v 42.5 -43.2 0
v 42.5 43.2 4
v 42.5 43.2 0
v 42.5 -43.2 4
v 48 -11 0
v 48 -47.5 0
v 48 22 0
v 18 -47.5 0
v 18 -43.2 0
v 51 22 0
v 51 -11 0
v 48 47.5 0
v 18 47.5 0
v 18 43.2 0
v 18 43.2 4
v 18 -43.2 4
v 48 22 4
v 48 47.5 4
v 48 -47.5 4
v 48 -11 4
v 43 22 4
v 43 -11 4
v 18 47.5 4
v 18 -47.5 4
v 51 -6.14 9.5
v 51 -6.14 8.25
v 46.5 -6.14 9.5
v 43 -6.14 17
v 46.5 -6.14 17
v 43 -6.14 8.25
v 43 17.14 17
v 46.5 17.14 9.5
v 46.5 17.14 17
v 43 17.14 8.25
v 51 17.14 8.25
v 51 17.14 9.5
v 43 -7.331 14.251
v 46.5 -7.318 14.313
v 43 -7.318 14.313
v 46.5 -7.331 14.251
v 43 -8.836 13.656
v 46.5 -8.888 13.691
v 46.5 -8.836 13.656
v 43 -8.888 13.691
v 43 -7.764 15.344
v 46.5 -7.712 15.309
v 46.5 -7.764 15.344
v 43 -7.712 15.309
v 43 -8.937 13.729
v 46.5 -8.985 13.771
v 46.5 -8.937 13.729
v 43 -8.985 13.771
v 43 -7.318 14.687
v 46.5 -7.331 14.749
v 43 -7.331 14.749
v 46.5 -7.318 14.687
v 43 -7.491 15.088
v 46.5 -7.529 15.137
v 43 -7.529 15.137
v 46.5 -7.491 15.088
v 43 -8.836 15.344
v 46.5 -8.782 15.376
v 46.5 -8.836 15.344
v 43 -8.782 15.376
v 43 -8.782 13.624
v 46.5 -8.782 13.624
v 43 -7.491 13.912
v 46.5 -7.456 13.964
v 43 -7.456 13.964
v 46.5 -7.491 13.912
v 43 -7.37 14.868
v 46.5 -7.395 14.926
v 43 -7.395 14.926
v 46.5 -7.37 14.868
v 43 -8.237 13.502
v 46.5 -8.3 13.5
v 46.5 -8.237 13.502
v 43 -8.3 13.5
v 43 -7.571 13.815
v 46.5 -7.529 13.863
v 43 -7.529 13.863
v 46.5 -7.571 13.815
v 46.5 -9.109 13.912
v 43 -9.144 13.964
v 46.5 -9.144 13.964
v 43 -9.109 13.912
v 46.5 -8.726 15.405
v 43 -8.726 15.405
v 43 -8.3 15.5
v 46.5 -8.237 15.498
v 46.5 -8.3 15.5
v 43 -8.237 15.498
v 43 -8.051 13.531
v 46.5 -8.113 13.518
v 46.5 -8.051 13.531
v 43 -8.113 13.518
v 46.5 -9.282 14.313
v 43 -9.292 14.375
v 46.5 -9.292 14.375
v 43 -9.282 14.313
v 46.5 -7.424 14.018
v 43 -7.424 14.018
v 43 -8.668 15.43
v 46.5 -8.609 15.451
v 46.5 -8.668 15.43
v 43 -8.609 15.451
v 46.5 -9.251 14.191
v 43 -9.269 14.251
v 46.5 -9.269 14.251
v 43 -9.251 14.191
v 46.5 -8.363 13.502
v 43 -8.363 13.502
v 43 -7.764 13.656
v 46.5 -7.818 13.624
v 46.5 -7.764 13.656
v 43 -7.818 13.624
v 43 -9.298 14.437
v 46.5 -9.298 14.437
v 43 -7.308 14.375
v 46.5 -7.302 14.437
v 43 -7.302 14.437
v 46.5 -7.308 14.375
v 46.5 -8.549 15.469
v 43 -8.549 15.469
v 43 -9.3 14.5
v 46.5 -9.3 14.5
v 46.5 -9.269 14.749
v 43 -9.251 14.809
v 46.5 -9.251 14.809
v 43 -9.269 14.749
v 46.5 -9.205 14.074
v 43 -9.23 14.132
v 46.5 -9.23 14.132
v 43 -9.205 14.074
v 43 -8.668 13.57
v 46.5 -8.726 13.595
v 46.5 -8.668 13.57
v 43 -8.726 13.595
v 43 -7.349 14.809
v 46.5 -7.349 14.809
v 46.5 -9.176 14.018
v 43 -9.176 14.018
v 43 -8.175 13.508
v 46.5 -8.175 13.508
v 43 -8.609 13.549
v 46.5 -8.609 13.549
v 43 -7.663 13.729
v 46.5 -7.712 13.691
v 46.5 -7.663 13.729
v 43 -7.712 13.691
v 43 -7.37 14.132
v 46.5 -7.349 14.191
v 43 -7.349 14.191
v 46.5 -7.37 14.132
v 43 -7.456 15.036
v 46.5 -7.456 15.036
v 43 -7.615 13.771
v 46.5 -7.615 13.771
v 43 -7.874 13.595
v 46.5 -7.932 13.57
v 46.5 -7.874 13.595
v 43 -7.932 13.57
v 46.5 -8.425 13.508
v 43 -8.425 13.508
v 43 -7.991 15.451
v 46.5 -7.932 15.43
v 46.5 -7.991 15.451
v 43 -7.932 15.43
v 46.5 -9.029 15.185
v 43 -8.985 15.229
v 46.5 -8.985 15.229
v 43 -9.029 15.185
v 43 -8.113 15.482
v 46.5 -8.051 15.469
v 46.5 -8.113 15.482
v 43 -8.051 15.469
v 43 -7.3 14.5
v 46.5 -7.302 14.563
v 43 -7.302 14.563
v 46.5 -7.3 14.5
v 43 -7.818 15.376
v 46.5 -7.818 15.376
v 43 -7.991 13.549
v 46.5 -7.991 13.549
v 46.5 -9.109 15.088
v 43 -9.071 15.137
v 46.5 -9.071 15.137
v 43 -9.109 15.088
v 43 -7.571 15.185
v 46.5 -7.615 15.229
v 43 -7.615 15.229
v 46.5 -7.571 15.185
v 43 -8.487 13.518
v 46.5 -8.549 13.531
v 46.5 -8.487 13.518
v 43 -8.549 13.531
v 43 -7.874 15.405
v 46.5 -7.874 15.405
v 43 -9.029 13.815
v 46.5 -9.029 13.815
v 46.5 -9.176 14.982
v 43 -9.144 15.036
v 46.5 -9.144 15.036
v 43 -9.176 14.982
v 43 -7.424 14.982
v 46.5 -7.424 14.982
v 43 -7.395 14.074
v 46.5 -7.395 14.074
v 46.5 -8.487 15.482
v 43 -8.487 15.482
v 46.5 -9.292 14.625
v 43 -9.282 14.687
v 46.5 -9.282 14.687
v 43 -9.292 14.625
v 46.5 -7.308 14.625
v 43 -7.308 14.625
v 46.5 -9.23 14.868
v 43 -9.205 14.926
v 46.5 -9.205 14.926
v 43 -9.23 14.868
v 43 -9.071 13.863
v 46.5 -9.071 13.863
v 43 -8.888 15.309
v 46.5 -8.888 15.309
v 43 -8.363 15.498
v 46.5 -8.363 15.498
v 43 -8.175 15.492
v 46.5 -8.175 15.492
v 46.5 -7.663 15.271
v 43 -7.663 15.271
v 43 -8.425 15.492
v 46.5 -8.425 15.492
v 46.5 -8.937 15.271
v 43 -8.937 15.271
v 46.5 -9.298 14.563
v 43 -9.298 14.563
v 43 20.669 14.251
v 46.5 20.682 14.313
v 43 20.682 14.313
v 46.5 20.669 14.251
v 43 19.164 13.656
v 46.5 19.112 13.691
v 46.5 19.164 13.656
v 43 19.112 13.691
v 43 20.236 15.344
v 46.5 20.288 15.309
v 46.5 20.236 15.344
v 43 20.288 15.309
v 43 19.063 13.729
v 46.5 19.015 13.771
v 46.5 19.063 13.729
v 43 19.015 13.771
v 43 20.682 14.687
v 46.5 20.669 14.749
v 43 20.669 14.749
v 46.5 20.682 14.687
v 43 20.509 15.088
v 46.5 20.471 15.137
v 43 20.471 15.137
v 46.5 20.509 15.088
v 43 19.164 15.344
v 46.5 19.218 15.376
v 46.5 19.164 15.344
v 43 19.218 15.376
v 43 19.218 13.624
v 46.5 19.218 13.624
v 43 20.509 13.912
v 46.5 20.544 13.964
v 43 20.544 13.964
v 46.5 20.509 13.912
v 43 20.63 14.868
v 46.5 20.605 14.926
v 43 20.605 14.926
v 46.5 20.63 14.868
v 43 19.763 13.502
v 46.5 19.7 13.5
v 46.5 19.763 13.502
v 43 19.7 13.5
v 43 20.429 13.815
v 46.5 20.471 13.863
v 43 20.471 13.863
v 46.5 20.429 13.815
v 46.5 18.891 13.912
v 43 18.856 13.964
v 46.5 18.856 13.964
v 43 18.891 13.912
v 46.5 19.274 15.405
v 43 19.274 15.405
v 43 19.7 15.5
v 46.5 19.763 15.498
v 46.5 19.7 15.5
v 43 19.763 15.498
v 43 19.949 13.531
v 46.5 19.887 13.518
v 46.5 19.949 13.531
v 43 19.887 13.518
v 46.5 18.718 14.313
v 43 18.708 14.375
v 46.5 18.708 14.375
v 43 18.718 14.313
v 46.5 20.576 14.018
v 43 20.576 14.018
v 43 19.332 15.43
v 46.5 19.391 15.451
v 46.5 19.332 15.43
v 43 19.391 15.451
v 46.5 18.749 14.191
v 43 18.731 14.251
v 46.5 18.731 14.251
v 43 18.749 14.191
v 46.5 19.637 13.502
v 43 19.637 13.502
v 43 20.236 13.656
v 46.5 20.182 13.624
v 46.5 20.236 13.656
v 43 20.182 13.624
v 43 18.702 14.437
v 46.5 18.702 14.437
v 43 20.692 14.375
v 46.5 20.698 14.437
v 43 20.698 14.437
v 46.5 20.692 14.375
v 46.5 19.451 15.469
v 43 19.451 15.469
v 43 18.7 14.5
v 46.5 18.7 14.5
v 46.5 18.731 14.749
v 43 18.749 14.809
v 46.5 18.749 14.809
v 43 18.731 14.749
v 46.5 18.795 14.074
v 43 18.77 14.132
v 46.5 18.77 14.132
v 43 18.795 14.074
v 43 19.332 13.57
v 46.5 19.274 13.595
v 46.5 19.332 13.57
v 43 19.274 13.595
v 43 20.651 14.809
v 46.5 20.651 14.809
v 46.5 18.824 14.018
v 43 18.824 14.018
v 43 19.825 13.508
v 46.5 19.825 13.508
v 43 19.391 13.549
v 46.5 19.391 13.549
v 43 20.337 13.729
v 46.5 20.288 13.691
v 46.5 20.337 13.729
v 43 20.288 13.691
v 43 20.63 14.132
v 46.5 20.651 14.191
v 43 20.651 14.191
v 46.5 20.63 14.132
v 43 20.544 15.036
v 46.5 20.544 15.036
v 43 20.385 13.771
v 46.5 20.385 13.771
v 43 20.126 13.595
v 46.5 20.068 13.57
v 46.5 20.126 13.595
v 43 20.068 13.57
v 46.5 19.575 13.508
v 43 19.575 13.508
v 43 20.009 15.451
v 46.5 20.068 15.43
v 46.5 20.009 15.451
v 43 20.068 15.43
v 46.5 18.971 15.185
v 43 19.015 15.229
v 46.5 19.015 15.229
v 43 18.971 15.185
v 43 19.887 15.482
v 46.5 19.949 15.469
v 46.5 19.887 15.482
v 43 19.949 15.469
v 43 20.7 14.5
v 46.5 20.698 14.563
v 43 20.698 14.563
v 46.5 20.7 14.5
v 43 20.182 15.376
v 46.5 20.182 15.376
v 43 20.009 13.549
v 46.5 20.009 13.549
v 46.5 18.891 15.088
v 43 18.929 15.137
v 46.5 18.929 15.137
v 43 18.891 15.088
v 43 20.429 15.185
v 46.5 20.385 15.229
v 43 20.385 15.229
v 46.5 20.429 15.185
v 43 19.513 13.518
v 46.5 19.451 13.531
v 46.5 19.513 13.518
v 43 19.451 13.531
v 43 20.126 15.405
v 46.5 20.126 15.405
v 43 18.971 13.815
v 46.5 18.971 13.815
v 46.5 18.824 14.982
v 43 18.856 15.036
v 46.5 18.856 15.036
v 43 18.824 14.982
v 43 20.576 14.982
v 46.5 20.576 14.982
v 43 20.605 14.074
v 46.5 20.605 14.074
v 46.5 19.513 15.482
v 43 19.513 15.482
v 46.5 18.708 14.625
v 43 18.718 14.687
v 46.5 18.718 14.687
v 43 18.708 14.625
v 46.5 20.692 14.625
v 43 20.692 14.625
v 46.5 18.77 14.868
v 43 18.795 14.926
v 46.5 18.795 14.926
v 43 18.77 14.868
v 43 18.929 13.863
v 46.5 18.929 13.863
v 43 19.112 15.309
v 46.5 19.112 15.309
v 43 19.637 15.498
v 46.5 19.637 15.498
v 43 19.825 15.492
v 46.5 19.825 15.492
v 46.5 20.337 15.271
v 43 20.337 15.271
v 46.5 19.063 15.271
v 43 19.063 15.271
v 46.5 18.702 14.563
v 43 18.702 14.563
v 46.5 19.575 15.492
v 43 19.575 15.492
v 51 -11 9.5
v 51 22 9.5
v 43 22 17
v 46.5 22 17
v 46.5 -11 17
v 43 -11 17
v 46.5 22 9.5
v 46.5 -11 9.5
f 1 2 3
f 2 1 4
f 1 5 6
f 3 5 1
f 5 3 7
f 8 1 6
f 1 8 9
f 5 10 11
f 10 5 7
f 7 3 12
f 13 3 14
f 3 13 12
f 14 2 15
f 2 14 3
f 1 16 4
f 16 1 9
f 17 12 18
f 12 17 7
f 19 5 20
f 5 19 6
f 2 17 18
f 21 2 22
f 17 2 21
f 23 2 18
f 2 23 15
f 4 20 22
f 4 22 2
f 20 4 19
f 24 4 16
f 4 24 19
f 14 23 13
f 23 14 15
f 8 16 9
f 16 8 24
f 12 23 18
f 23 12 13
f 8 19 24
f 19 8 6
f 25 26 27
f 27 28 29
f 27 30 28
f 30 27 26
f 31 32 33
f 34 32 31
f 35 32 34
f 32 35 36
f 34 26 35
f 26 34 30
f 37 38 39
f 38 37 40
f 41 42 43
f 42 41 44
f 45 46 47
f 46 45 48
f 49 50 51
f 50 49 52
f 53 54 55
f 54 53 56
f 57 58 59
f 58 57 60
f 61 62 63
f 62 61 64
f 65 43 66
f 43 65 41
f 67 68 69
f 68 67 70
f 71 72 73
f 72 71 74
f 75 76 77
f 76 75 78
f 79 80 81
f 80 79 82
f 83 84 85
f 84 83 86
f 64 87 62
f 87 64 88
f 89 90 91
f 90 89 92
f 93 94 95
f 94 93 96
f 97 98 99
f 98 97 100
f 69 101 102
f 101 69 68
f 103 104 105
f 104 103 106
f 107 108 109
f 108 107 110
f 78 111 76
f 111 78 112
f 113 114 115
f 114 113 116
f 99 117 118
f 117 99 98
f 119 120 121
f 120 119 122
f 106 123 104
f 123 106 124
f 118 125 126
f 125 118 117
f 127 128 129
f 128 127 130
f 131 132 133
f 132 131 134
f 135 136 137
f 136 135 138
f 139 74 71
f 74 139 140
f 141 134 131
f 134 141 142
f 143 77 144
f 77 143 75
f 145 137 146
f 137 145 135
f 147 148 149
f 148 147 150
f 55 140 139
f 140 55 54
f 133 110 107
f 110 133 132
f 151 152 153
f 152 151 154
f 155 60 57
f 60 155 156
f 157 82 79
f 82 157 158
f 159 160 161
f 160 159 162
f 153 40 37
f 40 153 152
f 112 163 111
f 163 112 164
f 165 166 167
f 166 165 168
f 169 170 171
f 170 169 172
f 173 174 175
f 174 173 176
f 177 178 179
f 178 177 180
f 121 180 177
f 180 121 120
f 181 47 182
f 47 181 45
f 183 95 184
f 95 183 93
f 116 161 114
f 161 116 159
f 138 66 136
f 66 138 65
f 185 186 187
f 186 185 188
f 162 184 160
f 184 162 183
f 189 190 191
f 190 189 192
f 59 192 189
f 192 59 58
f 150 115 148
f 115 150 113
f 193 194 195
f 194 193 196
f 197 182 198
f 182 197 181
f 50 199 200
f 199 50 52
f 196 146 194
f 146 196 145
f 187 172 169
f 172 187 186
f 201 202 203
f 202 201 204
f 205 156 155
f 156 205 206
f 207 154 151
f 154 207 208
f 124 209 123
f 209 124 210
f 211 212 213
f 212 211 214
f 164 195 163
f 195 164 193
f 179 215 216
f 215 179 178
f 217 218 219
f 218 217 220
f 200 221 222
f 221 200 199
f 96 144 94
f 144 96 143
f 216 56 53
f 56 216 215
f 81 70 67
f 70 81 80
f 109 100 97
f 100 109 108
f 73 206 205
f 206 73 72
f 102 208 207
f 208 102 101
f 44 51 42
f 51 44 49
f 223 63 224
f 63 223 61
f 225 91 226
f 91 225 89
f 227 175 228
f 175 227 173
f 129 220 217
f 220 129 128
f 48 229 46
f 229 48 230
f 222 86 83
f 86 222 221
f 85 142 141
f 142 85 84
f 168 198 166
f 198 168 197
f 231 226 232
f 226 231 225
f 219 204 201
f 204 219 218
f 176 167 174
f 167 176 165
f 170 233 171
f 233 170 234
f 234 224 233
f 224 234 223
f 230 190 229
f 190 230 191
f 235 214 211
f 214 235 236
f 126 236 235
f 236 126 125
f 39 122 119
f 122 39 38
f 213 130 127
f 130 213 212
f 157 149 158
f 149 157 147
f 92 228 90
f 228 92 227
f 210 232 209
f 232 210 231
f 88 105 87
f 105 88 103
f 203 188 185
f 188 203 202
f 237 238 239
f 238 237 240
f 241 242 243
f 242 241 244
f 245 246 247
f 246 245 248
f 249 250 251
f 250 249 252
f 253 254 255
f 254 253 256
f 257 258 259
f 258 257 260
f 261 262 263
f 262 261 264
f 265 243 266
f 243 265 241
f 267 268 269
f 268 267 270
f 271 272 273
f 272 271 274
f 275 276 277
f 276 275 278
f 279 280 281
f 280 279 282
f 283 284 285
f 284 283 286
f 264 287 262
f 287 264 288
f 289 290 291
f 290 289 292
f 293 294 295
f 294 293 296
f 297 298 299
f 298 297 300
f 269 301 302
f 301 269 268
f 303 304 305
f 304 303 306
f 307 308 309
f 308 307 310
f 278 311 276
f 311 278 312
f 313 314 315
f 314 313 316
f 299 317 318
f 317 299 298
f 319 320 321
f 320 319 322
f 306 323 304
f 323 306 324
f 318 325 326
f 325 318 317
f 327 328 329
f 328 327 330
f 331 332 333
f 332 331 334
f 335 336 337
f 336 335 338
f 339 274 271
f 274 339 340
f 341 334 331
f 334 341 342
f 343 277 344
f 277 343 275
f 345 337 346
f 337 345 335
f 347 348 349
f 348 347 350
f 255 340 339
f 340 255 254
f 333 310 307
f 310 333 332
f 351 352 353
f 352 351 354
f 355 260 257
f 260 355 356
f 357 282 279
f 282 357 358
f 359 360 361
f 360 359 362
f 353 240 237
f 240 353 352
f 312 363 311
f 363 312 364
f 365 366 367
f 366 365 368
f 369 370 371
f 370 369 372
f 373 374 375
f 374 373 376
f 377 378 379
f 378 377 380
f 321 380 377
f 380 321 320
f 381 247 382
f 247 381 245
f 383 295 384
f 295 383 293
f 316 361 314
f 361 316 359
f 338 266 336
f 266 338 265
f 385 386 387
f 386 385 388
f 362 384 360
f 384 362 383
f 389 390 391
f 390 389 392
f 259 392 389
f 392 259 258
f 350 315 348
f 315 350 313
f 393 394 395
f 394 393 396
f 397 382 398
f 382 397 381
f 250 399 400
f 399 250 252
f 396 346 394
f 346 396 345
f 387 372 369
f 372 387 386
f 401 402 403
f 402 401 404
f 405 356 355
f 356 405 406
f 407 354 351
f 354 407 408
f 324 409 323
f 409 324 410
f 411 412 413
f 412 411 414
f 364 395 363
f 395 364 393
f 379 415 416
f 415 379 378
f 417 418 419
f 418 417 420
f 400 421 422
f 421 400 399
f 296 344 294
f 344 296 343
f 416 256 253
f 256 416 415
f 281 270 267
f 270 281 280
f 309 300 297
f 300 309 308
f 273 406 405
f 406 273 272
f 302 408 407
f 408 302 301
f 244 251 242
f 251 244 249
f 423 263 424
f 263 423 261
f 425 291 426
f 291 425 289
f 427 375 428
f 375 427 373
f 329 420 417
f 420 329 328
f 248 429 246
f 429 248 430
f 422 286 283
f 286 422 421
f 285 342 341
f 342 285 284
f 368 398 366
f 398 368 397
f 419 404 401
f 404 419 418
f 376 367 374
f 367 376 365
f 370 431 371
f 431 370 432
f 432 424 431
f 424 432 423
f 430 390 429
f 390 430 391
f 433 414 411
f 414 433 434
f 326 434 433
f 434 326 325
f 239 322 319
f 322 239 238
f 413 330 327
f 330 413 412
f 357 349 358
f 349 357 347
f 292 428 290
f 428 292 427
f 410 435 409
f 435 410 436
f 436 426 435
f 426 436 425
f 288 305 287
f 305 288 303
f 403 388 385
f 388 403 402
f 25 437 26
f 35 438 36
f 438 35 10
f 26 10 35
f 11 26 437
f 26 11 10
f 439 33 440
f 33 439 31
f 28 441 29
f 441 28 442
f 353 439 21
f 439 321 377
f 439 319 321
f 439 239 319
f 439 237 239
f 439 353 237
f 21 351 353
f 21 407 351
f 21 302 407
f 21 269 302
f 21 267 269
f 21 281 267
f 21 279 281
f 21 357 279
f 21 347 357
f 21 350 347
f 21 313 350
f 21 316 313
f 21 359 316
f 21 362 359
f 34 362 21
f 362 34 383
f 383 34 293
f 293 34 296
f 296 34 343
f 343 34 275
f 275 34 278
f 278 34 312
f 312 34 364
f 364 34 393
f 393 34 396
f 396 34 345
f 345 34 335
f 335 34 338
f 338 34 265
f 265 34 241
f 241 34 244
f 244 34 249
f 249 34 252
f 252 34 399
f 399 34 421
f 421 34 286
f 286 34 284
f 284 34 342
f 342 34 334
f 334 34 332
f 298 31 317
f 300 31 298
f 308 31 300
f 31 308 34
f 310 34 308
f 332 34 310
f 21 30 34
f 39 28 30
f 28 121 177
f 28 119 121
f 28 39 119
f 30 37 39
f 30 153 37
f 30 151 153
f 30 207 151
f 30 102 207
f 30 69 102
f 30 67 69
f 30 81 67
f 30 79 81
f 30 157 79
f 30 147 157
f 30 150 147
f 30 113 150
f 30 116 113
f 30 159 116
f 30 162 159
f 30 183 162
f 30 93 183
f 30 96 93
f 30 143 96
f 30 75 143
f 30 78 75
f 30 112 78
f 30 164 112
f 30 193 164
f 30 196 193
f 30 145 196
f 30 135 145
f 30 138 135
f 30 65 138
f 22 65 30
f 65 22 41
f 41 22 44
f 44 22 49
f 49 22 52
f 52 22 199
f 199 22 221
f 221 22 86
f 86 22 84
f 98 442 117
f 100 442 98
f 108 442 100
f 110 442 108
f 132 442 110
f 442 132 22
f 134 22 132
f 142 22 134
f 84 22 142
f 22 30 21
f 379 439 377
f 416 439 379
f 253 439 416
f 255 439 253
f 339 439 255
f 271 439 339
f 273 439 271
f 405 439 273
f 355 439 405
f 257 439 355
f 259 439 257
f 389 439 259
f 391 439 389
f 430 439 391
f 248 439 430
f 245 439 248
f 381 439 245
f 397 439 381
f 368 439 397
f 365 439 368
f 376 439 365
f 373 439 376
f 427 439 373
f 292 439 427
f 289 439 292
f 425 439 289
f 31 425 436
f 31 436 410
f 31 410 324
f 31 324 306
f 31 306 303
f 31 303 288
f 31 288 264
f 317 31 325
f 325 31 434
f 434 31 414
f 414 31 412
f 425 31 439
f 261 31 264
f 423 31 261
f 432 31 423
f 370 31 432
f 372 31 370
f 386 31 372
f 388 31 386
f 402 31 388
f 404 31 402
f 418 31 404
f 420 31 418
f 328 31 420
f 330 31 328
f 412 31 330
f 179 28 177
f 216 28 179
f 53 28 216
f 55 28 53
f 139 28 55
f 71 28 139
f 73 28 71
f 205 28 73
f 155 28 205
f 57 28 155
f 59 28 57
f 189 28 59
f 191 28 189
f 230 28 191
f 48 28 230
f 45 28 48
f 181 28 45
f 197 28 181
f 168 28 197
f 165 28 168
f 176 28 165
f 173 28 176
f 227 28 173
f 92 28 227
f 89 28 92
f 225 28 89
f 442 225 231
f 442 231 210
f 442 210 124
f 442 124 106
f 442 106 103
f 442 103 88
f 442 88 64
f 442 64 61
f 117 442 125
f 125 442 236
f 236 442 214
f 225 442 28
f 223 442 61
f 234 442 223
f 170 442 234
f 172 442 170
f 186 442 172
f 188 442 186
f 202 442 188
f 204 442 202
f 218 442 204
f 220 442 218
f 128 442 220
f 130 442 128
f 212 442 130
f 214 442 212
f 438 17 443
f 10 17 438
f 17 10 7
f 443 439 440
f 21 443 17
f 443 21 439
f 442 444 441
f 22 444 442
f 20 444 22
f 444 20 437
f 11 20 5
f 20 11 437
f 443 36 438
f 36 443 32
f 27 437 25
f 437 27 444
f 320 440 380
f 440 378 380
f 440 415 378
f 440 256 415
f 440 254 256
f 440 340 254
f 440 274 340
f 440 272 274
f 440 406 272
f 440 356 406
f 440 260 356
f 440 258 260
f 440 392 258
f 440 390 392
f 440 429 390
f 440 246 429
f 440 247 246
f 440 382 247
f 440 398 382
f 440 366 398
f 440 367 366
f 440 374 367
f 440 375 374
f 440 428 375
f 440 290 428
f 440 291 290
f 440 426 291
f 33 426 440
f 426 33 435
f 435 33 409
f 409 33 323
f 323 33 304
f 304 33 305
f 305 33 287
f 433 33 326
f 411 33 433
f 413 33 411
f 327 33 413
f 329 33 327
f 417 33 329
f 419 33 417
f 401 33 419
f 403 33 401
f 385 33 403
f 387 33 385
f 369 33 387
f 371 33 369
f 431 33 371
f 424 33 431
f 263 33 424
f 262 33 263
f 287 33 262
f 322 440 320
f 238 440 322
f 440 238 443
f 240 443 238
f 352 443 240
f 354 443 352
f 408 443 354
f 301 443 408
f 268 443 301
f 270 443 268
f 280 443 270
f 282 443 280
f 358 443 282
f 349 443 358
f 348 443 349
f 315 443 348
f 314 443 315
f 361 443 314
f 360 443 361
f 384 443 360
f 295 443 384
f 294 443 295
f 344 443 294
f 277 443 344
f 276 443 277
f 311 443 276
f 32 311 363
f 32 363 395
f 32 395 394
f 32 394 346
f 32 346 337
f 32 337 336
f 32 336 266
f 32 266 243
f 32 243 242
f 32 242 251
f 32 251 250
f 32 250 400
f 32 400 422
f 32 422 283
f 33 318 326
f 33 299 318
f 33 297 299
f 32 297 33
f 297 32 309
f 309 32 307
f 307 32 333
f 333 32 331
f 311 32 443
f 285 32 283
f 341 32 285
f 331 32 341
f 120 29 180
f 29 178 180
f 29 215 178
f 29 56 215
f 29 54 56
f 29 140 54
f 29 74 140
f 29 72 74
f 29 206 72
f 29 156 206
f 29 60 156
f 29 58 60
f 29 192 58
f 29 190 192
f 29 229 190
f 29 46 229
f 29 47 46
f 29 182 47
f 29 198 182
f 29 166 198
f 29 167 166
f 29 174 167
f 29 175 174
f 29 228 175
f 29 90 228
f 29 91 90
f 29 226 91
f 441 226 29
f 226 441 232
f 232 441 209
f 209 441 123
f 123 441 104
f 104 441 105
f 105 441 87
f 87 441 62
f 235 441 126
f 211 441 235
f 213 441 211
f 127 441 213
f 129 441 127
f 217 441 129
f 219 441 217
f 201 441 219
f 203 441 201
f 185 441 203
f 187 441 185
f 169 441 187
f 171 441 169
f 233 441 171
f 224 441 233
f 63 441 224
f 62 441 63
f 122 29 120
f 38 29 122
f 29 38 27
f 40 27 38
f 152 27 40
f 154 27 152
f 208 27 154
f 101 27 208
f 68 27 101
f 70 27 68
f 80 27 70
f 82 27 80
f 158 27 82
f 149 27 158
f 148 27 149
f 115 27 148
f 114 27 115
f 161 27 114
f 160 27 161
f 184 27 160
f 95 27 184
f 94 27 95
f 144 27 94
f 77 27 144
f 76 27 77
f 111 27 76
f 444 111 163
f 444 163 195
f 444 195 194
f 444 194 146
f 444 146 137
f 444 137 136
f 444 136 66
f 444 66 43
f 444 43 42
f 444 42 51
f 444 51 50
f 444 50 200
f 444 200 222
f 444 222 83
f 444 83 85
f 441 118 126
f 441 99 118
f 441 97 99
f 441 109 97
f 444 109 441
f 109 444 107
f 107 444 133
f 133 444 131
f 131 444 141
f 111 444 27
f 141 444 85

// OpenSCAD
// file: servo.scad
$fn=100;

module servo(shell=false)
{
	cube([56,20.5,2.5],center=true);
	translate([0,0,-10])
		if(shell){ cube([44,21.5,40],true); } else { cube([42,20.5,40],true); }
	translate([11,0,10]){ cylinder(r=6,h=1.5); cylinder(r=3,h=5); }
	for(i=25*[-1,1]) for(j=5*[-1,1]) translate([i,j,0])
		cylinder(r=2.25,h=30,center=true);
}

module 9g_servo()
{
	l = 23.28; // length
	w = 12.5; // width (or depth)
	h = 23.3; // height of main body
	c = 6; // bottom "cap" height
	f = 5; // length of flange
	fz = 2.36; // thickness of flange
	fh = 16.44 + (fz/2); // position of flange
	
	mc = 3.75; // main cyl height
	ax = 2.75; // axle height
	ar = 2.455; // axle radius
	ah = h+ax; // axle pos
	sx = -0.89; // sub cyl center
	sr = 2.905; // sub cyl radius

	l2 = l/2;
	l4 = l/4;
	w2 = w/2;
	
	difference()
	{
		union() {
			translate( [-l2, -w2,  c] ) cube([l,w,h-c]); // main body
			translate( [-l2, -w2,  0] ) cube([l,w,  c]); // bottom cap
			translate( [  0,   0, fh] ) cube([l+f+f,w,fz], center=true); // flange
			translate( [ l4,   0,  h] ) cylinder(r=l4, h=mc); // main cyl
			translate( [ sx,   0,  h] ) cylinder(r=sr, h=mc); // sub cyl
			translate( [ l4,   0, ah] ) cylinder(r=ar, h=ax); // axle
		}
		translate([ 13.89,0,16.44]) cylinder(r=1, h=10, center=true);
		translate([-13.89,0,16.44]) cylinder(r=1, h=10, center=true);
		translate([ 13.89+1.5,0,16.44]) cube([3,1,10], center=true);
		translate([-13.89-1.5,0,16.44]) cube([3,1,10], center=true);
	}	
}

module servo_mount()
{
	//translate([0,0,16])
	difference()
	{
		translate([1,0,2]) cube([60,32,4],center=true);
		translate([0,0,6]) servo(true);
	}
	
	translate([30.5,0,10])
	{
		cube([4,32,20],center=true);
		translate([0,0,-6]) intersection()
		{
			rotate([0,45,0]) cube([17.5,32,17.5],true);
			for(i=[-1,1]) translate([-7,i*14,7]) cube([17.5,4,17.5],true);
		}
	}

	for(i=[-1,1]) translate([1,14.5*i,5.5]) cube([60,3,3],center=true);
}

difference()
{
	servo_mount();
	for(i=[-1,1]) for(j=[-1.25,-1,-0.75,0.75,1,1.25])
	translate([27,i*8,j+12.5]) rotate([0,90,0])
	{
        cylinder(r=3.5,h=6,$fn=6,center=true);
        cylinder(r=1.5,h=20,center=true);
    }
}

//% 9g_servo();

//servo_mount();
% translate([0,0,6]) rotate([0,180,0]) servo();
// main file
$fn=100;

use <servo.scad>

module switch_plate(shell=false)
{
	if(shell)
	{ translate([0,0,4]) cube([85,86.4,8],center=true); }
	translate([0,0,4]) intersection()
	{
		cube([85,85,8],center=true);
		translate([0,0,-296]) rotate([0,90,0])
			cylinder(r=300,h=90,center=true);
	}
	translate([0,0,10]) difference()
	{
		for(i=[-1,1]) translate([14*i,0,0]) cube([27,55,8],center=true);
		translate([0,0,298]) rotate([0,90,0])
			cylinder(r=300,h=80,center=true);
	}
}

difference()
{
	translate([33,0,2]) cube([30,95,4],center=true);
	switch_plate(true);
}
% switch_plate();



translate([47,5.5,8.5]) difference()
{
	cube([8,33,17],center=true);
	translate([10,0,6]) rotate([-90,180,90]) 9g_servo();
	translate([2,0,6]) cube([5,35,10],center=true);
	for(i=[-1,1]) translate([0,i*14+0.2,6]) rotate([0,90,0]) cylinder(r=1,h=10,center=true);
}

% translate([55,5.5,14.5]) rotate([-90,180,90]) 9g_servo();
